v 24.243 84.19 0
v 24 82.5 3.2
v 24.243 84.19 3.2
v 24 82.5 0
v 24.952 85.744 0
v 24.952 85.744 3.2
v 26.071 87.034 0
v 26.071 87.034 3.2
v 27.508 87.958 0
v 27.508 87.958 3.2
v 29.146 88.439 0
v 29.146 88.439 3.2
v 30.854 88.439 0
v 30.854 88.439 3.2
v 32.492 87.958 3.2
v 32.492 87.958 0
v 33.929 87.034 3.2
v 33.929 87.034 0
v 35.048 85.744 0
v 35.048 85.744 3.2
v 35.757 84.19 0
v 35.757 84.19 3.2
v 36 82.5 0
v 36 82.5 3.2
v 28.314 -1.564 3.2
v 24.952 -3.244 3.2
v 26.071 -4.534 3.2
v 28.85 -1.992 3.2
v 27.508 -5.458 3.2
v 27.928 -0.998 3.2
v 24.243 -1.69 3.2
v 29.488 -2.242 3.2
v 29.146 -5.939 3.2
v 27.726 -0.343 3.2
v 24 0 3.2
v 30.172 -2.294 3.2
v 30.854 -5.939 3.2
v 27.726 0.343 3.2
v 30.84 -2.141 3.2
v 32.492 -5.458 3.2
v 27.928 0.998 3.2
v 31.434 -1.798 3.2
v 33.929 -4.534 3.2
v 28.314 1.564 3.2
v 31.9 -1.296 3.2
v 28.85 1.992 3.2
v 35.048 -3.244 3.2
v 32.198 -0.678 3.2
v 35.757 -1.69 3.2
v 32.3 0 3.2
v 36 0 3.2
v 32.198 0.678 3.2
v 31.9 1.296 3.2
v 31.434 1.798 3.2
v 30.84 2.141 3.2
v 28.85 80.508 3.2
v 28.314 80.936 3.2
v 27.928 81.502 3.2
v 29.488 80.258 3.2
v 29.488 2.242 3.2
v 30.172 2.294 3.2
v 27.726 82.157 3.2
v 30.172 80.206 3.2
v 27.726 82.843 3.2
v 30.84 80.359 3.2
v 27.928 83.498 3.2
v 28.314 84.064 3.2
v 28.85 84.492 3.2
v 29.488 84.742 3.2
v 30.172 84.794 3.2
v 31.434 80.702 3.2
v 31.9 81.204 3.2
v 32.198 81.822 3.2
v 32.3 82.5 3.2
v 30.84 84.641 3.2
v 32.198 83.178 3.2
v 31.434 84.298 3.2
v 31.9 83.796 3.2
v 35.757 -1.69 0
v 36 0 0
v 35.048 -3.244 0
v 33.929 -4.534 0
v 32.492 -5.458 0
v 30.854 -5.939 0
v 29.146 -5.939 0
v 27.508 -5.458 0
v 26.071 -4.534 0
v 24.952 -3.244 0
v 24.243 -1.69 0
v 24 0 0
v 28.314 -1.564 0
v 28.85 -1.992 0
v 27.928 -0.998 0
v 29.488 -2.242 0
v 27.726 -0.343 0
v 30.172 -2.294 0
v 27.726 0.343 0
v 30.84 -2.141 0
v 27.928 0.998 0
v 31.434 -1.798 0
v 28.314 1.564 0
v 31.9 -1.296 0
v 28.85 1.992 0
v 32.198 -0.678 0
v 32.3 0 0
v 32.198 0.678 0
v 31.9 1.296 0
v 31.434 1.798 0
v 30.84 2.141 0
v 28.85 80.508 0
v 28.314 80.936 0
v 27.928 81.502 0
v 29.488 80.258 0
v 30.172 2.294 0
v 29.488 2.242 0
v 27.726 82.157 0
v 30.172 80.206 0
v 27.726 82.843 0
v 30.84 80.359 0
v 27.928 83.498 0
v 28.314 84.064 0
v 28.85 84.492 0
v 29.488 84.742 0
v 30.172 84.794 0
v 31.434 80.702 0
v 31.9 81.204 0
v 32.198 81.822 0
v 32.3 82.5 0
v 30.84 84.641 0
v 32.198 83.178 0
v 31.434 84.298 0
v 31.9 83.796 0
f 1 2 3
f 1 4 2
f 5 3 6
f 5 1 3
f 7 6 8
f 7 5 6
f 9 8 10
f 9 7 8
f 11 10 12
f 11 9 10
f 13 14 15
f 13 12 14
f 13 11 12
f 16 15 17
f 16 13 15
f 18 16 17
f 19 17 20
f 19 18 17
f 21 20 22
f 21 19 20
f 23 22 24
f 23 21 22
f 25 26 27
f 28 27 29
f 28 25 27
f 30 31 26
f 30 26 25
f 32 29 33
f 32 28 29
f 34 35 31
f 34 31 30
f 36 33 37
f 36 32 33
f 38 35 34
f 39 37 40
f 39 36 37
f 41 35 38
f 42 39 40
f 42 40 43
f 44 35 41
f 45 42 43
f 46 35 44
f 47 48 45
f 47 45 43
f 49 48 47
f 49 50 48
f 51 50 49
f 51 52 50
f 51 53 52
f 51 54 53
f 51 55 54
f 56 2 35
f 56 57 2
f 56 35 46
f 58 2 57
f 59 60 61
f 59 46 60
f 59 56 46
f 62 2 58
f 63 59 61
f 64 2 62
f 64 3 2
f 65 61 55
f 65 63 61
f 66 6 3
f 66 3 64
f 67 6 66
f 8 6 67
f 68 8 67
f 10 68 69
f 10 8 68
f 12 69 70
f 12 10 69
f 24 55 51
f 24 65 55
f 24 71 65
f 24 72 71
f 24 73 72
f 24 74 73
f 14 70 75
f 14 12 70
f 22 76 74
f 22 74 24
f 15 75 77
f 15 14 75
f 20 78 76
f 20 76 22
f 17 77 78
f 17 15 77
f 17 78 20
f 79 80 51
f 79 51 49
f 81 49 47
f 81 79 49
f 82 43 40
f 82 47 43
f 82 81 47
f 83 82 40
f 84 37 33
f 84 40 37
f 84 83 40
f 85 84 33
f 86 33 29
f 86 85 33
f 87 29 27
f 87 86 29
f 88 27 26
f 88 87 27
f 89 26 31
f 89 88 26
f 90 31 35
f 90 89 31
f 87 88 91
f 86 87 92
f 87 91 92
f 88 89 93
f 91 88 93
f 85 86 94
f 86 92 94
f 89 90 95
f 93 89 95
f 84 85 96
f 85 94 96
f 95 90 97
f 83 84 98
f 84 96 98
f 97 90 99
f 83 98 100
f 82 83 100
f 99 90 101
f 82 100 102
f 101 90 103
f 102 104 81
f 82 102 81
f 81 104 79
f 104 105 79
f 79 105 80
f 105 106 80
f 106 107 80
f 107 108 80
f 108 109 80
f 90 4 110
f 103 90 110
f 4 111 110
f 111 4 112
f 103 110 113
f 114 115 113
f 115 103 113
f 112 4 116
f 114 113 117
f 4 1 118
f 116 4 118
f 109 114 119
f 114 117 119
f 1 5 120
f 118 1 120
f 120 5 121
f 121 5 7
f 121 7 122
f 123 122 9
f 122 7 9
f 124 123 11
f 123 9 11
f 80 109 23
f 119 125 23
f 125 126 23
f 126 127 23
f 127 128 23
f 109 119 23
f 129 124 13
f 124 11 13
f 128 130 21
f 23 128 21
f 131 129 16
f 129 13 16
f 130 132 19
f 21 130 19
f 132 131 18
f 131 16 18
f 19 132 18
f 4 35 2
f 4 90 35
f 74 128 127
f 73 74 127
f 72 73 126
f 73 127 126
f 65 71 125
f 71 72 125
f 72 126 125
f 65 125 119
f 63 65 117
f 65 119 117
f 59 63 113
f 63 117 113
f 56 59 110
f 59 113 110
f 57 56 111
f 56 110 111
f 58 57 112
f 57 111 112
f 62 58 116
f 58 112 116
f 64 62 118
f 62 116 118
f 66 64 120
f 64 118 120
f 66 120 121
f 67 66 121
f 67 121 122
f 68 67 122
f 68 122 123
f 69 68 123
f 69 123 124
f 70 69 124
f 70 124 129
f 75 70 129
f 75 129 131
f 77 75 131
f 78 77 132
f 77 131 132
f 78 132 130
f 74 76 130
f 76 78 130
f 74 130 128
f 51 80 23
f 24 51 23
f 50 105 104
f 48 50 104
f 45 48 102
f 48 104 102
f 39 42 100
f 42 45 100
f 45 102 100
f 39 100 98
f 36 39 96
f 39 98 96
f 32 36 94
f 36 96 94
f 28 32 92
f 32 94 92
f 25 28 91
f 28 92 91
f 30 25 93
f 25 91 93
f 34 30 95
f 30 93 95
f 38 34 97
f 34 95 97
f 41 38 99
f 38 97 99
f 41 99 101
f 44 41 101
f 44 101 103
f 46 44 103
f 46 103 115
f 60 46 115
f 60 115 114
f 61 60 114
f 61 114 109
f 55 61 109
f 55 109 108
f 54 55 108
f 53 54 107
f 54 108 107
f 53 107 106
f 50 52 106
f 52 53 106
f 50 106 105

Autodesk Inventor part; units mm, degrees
ref_plane "YZ Plane" through (0, 0, 0) normal (1, 0, 0) x (0, 1, 0)
ref_plane "XZ Plane" through (0, 0, 0) normal (0, 1, 0) x (-1, 0, 0)
ref_plane "XY Plane" through (0, 0, 0) normal (0, 0, 1) x (1, 0, 0)
sketch "Sketch1" plane through (0, 0, 0) normal (0, 0, 1) x (1, 0, 0)
  circle A0 centre (30, 0) radius 2.3 projected
  circle A1 centre (30, 0) radius 6
  line L0 (24, 0) -> (24, 82.5)
  line L1 (36, 0) -> (36, 82.5)
  line L2 (24, 41.25) -> (36, 41.25) construction
  circle A2 centre (30, 82.5) radius 2.3
  circle A3 centre (30, 82.5) radius 6
  point P0 (0, 0)
  dimension "d0" = 12
  dimension "d1" = 82.5
extrude "Extrusion1" add sketch "Sketch1" along normal blind 3.2
properties part number "Eslabon_TransPot"
